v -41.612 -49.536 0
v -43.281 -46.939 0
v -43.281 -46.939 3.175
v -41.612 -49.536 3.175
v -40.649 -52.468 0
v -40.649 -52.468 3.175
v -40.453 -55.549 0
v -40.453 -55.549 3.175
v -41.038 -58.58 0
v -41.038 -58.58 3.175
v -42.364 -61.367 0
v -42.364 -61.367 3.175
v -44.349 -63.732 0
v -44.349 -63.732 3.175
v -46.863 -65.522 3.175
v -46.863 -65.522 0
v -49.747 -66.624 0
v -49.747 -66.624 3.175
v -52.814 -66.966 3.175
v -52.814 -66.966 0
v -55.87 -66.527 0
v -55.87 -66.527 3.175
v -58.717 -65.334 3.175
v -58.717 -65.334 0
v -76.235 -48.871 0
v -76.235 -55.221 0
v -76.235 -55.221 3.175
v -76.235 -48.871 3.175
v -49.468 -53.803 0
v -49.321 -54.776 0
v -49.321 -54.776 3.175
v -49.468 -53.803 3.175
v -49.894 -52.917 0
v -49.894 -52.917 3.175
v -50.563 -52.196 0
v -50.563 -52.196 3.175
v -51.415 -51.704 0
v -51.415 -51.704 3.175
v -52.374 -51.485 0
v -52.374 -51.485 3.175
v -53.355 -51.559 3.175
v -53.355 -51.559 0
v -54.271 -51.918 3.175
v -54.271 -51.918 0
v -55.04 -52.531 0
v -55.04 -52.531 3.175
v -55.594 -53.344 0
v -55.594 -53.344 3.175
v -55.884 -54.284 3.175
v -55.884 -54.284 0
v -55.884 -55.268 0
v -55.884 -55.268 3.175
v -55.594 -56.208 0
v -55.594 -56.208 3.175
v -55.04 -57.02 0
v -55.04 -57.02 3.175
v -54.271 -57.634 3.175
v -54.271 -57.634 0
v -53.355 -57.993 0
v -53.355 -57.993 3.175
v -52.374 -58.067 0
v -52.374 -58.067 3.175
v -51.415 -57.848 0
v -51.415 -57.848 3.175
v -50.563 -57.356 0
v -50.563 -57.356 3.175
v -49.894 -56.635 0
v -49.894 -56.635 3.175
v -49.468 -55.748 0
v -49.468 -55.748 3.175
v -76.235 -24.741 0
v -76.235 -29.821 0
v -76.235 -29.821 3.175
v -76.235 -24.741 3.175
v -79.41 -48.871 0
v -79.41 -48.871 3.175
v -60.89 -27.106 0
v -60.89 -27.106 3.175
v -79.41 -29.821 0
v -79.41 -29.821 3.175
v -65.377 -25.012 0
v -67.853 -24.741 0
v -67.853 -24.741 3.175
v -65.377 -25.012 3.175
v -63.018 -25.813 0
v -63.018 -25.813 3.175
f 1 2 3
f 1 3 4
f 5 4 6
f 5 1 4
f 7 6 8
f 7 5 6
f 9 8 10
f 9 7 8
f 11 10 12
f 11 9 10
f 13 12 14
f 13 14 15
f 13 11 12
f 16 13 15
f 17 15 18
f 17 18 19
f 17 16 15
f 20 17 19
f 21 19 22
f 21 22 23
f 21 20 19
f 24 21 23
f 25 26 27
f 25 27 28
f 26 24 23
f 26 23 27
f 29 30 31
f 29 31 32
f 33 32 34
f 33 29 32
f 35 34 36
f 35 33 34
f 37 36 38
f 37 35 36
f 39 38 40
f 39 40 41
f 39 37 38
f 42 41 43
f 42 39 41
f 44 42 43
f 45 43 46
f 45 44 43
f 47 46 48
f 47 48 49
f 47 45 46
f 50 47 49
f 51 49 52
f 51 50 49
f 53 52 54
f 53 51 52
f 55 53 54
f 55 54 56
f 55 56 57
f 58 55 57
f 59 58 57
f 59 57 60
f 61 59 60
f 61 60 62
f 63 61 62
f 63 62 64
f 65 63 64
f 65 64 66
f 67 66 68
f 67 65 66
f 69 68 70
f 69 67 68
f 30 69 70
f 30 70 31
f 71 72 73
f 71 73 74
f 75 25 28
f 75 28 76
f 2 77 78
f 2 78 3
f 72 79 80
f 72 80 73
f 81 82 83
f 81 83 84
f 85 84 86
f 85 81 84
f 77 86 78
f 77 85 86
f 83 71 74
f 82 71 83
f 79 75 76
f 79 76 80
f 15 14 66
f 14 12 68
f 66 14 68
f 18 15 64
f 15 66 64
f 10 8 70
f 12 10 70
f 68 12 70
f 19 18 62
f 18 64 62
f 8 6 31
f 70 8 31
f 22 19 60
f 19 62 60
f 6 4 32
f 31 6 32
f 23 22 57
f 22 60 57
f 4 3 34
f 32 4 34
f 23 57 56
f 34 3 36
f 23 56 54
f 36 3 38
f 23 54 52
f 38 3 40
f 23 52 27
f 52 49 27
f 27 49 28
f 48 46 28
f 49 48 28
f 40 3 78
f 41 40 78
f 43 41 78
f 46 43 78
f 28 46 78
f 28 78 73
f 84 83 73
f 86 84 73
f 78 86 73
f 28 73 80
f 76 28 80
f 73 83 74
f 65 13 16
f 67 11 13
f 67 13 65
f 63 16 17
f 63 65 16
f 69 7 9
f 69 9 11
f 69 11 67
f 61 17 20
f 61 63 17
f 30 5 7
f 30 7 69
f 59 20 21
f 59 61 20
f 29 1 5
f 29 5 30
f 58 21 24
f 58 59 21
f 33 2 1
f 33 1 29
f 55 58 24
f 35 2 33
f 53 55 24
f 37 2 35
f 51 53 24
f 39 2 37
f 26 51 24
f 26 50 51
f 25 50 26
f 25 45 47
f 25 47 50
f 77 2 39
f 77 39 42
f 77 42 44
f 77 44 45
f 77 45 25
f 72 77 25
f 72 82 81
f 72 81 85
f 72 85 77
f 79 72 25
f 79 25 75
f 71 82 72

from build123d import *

# Parameters (mm, degrees)
SKETCH1_R           = 3.3
BOSS_EXTRUDE1_DEPTH = 3.175


with BuildPart() as part:
    # Sketch1 → Boss-Extrude1 (new body)
    with BuildSketch(Plane.XY):
        with BuildLine():
            Line((-79.409543338, -48.870574021), (-79.409543338, -29.820574021))
            Line((-79.409543338, -29.820574021), (-76.234543338, -29.820574021))
            Line((-76.234543338, -29.820574021), (-76.234543338, -24.740574021))
            Line((-76.234543338, -24.740574021), (-67.852543338, -24.740574021))
            ThreePointArc((-67.852543338, -24.740574021), (-64.175656813, -25.348124877), (-60.889653149, -27.10618986))
            Line((-60.889653149, -27.10618986), (-43.281292183, -46.938938374))
            ThreePointArc((-43.281292183, -46.938938374), (-43.281292183, -62.612671449), (-58.716906034, -65.334386634))
            Line((-58.716906034, -65.334386634), (-76.234543338, -55.220574021))
            Line((-76.234543338, -55.220574021), (-76.234543338, -48.870574021))
            Line((-76.234543338, -48.870574021), (-79.409543338, -48.870574021))
        make_face()
        with Locations((-52.620906034, -54.775804912)):
            Circle(SKETCH1_R, mode=Mode.SUBTRACT)
    extrude(amount=BOSS_EXTRUDE1_DEPTH)


solid = part.part
